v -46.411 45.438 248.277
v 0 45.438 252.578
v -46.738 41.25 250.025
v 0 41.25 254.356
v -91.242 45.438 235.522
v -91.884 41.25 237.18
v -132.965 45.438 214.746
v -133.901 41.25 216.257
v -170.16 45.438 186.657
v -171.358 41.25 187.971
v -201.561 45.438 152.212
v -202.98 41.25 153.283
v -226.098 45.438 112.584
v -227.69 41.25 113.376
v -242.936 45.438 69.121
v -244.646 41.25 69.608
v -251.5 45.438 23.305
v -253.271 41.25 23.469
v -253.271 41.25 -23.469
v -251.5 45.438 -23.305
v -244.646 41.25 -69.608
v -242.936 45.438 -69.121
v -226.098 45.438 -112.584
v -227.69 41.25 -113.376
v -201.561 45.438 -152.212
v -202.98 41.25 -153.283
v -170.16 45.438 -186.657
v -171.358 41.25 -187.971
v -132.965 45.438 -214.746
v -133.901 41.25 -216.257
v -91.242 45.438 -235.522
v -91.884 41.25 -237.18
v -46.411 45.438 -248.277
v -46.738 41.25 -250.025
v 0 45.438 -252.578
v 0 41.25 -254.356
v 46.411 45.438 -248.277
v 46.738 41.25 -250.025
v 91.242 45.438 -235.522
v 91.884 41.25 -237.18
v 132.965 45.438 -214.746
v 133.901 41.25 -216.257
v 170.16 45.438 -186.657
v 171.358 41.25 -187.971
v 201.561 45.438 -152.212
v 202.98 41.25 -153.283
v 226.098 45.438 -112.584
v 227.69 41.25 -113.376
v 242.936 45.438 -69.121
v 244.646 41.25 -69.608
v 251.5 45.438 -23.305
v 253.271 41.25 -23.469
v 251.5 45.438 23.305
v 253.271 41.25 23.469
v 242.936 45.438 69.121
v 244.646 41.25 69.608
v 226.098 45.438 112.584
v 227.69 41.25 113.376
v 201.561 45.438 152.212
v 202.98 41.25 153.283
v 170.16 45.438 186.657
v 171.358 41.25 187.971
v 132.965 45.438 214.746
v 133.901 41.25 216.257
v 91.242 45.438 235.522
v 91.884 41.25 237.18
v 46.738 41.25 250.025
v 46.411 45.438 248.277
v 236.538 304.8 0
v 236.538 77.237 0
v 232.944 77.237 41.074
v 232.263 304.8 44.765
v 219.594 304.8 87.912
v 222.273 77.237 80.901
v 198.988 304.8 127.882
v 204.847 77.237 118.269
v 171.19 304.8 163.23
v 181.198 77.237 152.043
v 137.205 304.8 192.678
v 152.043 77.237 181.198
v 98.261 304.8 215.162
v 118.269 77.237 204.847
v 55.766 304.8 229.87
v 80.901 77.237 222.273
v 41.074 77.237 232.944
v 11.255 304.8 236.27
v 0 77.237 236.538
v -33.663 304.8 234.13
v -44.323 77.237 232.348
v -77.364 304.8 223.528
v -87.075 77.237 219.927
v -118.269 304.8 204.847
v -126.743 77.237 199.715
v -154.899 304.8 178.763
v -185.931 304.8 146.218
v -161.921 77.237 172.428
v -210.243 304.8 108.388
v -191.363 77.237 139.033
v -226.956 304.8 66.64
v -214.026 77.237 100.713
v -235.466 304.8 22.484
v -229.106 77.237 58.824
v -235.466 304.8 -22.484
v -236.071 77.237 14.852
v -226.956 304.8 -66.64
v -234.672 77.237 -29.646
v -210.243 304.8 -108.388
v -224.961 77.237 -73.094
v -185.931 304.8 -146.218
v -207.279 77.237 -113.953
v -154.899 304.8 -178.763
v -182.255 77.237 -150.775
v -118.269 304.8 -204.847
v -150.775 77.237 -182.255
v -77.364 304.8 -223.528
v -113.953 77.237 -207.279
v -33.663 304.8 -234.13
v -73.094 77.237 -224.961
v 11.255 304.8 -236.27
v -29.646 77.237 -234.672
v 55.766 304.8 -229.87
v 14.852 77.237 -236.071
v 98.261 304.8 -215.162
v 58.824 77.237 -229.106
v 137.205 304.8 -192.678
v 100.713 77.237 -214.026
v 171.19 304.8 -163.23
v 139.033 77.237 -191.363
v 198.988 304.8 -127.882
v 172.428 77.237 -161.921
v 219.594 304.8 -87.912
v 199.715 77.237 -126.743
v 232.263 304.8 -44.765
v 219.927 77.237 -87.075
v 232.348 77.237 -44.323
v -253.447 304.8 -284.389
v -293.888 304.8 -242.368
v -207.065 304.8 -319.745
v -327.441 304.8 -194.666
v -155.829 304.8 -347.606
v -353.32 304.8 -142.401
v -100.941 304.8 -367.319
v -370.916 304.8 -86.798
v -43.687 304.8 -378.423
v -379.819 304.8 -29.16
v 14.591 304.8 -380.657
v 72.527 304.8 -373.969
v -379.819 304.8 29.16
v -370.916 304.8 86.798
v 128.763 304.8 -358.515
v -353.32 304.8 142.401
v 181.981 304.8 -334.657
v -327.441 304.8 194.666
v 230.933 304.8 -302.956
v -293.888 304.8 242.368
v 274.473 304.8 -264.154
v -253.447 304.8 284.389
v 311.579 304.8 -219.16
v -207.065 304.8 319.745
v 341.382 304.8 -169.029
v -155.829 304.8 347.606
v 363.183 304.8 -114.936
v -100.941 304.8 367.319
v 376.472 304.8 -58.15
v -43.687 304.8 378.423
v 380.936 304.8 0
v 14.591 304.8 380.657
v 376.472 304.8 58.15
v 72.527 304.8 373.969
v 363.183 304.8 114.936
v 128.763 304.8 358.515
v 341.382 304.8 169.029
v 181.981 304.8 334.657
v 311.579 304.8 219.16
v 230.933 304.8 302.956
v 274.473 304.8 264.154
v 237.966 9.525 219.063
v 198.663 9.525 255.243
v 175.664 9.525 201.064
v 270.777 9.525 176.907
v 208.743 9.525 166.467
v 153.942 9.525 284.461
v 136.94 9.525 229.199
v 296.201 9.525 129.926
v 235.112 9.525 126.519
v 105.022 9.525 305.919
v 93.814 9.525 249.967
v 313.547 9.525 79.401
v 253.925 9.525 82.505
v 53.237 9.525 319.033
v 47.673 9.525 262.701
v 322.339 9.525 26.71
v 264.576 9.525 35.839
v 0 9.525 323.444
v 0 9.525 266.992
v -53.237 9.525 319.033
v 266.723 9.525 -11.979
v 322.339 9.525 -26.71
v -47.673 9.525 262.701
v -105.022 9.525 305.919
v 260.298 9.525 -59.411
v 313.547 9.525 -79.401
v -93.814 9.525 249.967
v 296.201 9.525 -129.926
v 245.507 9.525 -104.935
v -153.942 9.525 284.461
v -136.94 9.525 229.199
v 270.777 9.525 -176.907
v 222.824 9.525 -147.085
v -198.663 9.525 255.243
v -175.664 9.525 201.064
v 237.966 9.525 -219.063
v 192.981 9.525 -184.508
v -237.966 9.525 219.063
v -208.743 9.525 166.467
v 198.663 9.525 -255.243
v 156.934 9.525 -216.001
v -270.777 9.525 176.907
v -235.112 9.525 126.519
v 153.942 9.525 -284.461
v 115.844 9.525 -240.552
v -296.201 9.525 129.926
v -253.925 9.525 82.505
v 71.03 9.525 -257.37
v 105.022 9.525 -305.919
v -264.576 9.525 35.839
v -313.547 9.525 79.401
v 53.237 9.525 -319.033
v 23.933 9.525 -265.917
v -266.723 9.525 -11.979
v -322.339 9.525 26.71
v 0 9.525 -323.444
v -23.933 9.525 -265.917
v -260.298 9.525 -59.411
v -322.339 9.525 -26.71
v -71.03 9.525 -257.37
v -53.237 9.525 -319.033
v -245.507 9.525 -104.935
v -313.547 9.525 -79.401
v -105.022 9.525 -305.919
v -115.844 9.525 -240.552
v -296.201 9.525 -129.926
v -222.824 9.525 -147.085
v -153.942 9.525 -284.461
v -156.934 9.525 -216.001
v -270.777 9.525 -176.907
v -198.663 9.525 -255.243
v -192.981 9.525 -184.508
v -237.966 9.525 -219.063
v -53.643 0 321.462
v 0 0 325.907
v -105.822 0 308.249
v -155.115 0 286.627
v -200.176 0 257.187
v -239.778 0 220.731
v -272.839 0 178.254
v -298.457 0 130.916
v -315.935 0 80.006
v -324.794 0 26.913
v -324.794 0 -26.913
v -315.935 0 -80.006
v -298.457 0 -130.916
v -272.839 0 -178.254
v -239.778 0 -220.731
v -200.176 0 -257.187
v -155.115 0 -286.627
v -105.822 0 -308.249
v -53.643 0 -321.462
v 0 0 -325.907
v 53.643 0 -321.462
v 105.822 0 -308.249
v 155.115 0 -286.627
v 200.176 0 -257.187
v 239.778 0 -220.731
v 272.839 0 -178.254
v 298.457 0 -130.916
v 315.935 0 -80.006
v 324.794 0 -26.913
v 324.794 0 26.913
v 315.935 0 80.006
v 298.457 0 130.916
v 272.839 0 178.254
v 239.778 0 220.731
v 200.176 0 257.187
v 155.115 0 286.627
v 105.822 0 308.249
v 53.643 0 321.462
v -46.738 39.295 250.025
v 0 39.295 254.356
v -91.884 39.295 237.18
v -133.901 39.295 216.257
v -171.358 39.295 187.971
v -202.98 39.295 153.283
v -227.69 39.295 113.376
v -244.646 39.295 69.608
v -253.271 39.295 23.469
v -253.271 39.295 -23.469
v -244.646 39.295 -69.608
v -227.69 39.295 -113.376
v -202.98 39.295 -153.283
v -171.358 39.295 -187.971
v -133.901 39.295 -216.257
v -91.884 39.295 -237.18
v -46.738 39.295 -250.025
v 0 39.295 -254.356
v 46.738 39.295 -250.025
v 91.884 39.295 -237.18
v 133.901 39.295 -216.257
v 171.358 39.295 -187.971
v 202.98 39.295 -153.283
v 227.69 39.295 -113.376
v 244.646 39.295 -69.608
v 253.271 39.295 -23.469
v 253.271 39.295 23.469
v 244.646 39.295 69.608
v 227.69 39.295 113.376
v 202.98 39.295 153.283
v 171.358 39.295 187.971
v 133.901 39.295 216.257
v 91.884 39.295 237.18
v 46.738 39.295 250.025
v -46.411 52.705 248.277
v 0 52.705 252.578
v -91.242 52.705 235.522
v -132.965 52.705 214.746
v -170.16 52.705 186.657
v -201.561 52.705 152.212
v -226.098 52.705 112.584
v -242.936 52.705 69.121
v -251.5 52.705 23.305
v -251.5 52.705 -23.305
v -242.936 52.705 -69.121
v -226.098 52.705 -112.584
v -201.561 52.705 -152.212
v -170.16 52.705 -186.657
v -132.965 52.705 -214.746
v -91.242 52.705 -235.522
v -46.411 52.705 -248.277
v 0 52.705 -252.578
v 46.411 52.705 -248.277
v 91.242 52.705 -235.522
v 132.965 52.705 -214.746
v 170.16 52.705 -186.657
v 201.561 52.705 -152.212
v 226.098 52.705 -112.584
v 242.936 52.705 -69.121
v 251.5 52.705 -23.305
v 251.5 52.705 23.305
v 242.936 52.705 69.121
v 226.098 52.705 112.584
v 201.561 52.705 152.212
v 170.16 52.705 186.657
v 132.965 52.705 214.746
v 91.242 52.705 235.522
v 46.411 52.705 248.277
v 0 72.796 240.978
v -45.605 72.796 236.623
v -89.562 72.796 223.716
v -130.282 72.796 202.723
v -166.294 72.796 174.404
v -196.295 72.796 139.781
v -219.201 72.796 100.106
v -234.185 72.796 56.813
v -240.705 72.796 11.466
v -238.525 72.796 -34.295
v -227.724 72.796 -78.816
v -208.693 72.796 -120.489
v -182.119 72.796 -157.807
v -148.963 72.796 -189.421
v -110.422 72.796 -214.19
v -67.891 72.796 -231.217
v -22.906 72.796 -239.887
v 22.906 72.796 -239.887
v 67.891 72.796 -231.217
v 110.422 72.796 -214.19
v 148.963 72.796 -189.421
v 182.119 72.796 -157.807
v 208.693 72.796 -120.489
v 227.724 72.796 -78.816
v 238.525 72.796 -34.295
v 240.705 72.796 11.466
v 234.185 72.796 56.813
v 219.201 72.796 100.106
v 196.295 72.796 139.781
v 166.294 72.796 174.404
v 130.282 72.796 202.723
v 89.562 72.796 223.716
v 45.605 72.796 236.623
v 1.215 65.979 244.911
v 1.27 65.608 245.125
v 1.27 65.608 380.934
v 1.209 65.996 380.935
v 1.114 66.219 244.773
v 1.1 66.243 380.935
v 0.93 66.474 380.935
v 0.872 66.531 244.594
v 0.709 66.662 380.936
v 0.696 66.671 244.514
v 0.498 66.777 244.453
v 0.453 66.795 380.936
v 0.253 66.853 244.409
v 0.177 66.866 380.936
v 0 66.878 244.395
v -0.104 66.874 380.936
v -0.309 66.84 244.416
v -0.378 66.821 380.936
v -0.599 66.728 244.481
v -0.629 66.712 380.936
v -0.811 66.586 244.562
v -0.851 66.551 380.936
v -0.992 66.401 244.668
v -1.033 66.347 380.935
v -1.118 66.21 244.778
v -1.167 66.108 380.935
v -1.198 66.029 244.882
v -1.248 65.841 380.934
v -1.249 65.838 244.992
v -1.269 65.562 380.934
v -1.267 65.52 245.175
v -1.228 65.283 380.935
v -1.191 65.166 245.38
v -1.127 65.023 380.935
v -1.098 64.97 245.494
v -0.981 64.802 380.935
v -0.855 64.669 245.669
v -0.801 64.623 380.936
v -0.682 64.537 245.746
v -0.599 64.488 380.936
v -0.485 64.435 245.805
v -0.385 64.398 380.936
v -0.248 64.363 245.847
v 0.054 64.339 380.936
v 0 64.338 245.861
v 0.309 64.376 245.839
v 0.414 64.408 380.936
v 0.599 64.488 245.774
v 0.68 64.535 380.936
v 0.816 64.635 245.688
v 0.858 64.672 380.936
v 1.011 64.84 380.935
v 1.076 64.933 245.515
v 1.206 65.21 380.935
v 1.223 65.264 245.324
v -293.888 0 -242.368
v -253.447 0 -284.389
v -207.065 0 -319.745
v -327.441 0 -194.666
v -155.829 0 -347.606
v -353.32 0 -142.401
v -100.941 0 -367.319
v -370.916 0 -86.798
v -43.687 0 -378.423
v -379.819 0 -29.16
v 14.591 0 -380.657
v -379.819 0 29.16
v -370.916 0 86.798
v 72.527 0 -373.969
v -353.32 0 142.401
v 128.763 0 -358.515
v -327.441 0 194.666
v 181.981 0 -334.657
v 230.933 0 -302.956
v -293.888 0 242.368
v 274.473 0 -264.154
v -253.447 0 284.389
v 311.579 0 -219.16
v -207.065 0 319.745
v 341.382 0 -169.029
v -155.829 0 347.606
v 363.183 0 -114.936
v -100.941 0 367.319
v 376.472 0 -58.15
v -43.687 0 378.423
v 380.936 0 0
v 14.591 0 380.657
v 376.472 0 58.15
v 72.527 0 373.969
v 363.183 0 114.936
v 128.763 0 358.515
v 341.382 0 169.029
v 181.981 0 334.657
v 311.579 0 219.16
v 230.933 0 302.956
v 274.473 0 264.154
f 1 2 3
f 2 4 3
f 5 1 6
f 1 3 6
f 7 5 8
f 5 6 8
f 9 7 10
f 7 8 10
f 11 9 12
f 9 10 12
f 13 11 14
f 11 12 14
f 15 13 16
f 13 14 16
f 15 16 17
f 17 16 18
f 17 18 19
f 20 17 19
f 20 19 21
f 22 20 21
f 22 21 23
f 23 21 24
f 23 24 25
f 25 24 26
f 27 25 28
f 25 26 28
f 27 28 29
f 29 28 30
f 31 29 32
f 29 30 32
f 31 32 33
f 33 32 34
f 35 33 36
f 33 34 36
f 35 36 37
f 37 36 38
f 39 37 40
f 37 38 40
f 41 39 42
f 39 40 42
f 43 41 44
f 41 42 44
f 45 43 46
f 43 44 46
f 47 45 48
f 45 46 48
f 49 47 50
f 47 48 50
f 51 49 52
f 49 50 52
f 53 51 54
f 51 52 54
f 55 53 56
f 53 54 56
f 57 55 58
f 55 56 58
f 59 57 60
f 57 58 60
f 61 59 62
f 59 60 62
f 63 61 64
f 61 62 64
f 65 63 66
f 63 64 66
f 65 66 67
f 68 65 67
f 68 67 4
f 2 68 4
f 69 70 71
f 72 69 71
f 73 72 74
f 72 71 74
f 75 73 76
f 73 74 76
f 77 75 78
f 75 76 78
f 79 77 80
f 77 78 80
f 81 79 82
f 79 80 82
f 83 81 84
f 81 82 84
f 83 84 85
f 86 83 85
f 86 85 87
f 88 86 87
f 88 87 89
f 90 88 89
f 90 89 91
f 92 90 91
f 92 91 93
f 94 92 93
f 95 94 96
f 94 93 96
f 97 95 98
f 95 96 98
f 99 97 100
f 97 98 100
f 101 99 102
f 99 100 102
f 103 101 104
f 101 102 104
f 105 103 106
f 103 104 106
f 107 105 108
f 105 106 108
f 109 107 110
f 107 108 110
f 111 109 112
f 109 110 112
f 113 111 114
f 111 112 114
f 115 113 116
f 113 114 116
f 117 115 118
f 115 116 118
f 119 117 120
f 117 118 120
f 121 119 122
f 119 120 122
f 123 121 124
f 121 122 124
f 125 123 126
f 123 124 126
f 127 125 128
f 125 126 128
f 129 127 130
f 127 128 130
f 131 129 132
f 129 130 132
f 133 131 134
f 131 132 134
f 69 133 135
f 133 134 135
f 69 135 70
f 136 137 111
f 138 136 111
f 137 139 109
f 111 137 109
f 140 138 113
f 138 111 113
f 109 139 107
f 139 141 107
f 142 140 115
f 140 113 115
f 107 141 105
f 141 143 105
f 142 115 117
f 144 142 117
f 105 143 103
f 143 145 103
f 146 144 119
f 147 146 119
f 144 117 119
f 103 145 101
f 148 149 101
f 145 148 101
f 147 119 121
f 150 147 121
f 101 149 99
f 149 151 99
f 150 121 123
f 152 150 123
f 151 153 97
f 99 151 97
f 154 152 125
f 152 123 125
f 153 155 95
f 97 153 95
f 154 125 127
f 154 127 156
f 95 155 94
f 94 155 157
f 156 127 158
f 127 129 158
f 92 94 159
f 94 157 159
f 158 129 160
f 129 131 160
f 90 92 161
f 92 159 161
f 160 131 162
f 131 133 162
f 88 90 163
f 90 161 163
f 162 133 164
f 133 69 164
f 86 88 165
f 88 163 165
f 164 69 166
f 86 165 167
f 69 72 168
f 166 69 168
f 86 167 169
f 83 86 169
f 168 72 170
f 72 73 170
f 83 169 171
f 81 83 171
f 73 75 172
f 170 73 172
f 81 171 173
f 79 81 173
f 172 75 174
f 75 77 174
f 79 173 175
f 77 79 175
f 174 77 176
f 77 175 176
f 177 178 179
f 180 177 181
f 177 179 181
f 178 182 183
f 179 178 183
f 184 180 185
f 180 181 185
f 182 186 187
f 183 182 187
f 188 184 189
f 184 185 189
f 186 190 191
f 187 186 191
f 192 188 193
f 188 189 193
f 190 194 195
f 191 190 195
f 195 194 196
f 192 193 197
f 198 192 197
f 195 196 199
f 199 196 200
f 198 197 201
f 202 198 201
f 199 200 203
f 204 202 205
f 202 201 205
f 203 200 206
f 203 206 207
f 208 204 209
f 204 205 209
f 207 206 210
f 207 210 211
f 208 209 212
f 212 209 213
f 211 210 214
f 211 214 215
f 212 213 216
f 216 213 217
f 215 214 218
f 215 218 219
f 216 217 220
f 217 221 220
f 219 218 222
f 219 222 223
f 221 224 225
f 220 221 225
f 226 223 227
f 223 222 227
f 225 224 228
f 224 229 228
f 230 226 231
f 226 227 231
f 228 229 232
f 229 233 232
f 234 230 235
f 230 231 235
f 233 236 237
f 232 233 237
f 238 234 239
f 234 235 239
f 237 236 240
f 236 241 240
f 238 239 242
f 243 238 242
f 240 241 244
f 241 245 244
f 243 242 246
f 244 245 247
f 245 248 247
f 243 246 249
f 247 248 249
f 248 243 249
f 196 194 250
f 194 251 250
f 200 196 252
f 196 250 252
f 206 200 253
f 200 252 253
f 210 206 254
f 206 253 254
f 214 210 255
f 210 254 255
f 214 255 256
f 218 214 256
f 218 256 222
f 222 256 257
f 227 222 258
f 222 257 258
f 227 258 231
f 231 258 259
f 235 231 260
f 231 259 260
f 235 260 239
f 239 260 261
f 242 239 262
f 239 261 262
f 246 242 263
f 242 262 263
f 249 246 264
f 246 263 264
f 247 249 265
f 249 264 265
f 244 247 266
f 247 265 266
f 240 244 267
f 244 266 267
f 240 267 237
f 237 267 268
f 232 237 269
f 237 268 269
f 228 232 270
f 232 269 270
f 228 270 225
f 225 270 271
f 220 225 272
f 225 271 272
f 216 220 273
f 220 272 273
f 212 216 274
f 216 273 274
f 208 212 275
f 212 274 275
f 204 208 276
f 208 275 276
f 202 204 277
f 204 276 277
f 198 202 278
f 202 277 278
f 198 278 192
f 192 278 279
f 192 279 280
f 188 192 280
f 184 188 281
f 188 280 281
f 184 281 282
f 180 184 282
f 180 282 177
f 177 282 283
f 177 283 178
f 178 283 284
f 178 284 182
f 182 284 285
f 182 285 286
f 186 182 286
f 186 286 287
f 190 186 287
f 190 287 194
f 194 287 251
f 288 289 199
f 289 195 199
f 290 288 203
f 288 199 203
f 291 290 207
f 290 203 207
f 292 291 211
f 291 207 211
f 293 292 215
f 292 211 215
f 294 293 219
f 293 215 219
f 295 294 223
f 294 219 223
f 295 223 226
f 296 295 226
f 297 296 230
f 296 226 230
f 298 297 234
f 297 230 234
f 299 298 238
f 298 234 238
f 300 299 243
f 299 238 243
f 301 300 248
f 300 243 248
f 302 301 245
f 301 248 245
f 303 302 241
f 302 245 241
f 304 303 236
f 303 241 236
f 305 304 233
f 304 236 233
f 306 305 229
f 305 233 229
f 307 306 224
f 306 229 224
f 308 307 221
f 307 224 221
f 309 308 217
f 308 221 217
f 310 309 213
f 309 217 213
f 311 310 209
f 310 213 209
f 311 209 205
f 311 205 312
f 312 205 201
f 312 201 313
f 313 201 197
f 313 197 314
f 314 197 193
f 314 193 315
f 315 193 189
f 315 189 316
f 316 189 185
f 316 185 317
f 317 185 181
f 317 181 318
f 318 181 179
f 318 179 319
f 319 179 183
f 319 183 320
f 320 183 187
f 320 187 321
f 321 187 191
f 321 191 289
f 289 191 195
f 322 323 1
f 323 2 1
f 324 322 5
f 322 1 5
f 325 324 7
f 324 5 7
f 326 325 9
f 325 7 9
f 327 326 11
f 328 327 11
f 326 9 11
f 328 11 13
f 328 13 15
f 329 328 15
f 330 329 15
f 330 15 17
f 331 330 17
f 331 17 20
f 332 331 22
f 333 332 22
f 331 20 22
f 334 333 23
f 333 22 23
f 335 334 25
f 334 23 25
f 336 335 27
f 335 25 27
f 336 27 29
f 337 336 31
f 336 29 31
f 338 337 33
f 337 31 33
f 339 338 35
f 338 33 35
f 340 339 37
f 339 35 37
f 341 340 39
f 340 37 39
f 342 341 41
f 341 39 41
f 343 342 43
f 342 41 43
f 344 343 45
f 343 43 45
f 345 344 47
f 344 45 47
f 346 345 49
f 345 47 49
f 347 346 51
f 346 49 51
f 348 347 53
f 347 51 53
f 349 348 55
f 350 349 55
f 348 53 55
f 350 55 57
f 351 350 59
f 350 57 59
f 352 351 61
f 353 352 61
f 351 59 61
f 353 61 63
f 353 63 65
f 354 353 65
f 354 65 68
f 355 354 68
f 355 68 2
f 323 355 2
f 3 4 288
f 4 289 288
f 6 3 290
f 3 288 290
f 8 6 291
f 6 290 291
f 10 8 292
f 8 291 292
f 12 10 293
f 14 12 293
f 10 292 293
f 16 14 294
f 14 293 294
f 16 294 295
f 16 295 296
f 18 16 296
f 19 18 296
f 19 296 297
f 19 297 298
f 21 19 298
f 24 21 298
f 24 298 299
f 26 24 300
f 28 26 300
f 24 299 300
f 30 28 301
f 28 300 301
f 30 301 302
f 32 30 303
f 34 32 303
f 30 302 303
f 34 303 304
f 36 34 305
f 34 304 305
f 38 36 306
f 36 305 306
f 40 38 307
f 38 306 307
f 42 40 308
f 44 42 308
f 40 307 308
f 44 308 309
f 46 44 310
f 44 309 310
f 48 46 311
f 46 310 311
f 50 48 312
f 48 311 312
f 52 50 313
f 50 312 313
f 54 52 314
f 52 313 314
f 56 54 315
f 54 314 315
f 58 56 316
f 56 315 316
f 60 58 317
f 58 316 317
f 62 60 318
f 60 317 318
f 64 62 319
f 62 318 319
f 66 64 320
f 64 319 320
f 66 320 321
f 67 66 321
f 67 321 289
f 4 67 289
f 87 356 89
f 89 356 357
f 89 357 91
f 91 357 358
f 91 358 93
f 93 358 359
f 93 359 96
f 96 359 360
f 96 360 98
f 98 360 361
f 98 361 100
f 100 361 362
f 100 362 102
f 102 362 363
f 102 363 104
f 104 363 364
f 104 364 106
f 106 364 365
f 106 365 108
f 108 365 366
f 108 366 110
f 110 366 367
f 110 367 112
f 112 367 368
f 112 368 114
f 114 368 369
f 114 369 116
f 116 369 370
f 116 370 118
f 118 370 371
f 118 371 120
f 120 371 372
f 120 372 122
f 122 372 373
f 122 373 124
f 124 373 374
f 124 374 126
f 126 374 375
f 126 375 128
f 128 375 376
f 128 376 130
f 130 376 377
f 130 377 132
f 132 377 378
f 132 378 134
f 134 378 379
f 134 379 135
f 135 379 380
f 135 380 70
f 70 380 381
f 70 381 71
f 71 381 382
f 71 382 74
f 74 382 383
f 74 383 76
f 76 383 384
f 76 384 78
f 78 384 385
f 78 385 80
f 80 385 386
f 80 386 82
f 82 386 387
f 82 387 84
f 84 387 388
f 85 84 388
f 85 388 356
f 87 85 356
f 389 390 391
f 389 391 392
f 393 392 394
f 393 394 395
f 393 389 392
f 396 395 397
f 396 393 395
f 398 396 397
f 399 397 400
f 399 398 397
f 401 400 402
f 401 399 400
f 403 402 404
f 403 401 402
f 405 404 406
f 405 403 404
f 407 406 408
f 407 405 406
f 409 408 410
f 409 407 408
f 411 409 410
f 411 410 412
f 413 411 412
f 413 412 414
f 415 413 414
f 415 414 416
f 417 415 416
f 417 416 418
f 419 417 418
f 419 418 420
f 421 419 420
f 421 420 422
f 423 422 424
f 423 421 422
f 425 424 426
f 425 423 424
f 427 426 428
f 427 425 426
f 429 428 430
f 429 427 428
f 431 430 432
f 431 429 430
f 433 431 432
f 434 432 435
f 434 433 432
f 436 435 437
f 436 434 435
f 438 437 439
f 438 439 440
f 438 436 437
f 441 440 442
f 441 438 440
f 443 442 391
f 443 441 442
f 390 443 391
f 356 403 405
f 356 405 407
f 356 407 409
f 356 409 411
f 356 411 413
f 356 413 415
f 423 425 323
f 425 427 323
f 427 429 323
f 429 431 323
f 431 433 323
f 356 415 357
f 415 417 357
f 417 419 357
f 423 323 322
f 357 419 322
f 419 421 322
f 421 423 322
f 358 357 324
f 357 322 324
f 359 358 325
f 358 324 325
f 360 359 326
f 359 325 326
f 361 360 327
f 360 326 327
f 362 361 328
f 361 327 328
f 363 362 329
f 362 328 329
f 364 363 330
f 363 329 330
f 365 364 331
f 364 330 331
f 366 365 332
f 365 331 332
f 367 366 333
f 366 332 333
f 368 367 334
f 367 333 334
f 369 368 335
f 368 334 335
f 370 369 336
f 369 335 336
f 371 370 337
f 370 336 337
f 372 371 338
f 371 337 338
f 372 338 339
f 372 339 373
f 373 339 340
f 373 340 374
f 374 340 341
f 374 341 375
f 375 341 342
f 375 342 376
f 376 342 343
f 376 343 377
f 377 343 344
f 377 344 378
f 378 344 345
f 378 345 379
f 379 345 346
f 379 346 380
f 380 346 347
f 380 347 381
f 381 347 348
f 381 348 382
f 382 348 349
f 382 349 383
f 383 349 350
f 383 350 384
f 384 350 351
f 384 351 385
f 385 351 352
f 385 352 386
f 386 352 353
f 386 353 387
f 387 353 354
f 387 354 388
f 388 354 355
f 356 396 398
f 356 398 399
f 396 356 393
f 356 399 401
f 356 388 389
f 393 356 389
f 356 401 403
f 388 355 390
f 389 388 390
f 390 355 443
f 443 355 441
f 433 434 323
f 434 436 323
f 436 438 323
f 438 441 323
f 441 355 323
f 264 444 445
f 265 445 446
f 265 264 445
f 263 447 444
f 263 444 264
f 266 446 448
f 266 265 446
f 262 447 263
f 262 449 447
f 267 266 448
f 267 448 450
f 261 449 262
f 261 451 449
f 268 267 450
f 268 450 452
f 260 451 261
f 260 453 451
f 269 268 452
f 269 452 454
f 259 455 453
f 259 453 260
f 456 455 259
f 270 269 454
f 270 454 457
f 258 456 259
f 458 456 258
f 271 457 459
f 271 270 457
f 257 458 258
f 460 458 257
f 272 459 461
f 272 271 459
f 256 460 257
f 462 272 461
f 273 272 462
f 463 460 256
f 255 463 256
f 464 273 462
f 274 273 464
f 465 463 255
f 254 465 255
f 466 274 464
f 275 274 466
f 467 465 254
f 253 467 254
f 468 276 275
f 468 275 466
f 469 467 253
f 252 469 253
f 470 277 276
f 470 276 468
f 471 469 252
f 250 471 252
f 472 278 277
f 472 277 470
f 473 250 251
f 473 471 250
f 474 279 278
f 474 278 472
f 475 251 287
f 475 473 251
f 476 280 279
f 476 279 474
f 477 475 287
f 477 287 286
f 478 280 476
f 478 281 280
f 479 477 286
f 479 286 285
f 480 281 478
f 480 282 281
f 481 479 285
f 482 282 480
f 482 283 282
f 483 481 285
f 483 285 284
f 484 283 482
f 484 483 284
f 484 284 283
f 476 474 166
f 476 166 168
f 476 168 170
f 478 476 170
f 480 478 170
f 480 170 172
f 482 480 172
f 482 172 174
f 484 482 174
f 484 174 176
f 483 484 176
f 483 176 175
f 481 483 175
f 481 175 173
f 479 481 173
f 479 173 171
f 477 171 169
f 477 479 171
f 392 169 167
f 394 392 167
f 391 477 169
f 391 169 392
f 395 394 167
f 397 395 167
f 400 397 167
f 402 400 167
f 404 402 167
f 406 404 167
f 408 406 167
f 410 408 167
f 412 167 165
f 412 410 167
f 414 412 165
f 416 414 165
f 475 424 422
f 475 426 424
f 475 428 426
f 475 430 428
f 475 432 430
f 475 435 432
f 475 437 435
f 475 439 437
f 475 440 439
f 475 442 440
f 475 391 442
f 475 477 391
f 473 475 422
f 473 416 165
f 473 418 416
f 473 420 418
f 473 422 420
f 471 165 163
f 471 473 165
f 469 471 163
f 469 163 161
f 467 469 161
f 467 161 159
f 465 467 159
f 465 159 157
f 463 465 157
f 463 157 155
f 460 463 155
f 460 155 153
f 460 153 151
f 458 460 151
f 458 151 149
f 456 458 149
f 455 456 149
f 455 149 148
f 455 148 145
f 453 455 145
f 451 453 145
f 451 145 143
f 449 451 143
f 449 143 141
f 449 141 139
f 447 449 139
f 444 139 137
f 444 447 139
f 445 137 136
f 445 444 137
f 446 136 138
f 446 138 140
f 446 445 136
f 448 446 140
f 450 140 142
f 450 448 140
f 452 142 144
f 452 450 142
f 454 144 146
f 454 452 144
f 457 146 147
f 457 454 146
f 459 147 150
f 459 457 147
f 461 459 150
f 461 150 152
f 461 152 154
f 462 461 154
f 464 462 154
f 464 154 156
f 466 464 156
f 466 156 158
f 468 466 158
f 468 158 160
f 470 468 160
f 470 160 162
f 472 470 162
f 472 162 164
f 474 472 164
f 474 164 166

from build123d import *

# Parameters (mm, degrees)
F0_R     = 380.9365
F0_R_2   = 236.5375
F1_DEPTH = 304.8
F6_R     = 1.27
F7_DEPTH = 380.9375


with BuildPart() as f1:
    # F0 (on Front) → F1 (new body)
    with BuildSketch(Plane.XZ):
        Circle(F0_R)
        Circle(F0_R_2, mode=Mode.SUBTRACT)
    extrude(amount=-F1_DEPTH)

    # F2 (on Right) → F3 (revolve, cut)
    with BuildSketch(Plane.YZ):
        Polygon((-0.674657, 0), (0, 0), (9.525, 0), (9.525, 323.444068), (0, 325.9074), (-38.13795, 325.9074), align=None)
    revolve(axis=Axis((0, -111.905819, 0), (0, -1, 0)), mode=Mode.SUBTRACT)

    # F4 (on Right) → F5 (revolve, cut)
    with BuildSketch(Plane.YZ):
        Polygon((39.294728, 254.3556), (9.525, 266.9921), (-83.954796, 266.9921), (-48.076838, 187.997639), (83.789648, 229.984577), (72.7964, 240.977825), (52.705, 252.5776), (45.438306, 252.5776), (41.2496, 254.3556), align=None)
    revolve(axis=Axis((0, 0, 0), (0, -1, 0)), mode=Mode.SUBTRACT)

    # F6 (on Top) → F7 (cut, through all)
    with BuildSketch(Plane.XY):
        with Locations((0, 65.6082)):
            Circle(F6_R)
    extrude(amount=F7_DEPTH, mode=Mode.SUBTRACT)


solid = f1.part
